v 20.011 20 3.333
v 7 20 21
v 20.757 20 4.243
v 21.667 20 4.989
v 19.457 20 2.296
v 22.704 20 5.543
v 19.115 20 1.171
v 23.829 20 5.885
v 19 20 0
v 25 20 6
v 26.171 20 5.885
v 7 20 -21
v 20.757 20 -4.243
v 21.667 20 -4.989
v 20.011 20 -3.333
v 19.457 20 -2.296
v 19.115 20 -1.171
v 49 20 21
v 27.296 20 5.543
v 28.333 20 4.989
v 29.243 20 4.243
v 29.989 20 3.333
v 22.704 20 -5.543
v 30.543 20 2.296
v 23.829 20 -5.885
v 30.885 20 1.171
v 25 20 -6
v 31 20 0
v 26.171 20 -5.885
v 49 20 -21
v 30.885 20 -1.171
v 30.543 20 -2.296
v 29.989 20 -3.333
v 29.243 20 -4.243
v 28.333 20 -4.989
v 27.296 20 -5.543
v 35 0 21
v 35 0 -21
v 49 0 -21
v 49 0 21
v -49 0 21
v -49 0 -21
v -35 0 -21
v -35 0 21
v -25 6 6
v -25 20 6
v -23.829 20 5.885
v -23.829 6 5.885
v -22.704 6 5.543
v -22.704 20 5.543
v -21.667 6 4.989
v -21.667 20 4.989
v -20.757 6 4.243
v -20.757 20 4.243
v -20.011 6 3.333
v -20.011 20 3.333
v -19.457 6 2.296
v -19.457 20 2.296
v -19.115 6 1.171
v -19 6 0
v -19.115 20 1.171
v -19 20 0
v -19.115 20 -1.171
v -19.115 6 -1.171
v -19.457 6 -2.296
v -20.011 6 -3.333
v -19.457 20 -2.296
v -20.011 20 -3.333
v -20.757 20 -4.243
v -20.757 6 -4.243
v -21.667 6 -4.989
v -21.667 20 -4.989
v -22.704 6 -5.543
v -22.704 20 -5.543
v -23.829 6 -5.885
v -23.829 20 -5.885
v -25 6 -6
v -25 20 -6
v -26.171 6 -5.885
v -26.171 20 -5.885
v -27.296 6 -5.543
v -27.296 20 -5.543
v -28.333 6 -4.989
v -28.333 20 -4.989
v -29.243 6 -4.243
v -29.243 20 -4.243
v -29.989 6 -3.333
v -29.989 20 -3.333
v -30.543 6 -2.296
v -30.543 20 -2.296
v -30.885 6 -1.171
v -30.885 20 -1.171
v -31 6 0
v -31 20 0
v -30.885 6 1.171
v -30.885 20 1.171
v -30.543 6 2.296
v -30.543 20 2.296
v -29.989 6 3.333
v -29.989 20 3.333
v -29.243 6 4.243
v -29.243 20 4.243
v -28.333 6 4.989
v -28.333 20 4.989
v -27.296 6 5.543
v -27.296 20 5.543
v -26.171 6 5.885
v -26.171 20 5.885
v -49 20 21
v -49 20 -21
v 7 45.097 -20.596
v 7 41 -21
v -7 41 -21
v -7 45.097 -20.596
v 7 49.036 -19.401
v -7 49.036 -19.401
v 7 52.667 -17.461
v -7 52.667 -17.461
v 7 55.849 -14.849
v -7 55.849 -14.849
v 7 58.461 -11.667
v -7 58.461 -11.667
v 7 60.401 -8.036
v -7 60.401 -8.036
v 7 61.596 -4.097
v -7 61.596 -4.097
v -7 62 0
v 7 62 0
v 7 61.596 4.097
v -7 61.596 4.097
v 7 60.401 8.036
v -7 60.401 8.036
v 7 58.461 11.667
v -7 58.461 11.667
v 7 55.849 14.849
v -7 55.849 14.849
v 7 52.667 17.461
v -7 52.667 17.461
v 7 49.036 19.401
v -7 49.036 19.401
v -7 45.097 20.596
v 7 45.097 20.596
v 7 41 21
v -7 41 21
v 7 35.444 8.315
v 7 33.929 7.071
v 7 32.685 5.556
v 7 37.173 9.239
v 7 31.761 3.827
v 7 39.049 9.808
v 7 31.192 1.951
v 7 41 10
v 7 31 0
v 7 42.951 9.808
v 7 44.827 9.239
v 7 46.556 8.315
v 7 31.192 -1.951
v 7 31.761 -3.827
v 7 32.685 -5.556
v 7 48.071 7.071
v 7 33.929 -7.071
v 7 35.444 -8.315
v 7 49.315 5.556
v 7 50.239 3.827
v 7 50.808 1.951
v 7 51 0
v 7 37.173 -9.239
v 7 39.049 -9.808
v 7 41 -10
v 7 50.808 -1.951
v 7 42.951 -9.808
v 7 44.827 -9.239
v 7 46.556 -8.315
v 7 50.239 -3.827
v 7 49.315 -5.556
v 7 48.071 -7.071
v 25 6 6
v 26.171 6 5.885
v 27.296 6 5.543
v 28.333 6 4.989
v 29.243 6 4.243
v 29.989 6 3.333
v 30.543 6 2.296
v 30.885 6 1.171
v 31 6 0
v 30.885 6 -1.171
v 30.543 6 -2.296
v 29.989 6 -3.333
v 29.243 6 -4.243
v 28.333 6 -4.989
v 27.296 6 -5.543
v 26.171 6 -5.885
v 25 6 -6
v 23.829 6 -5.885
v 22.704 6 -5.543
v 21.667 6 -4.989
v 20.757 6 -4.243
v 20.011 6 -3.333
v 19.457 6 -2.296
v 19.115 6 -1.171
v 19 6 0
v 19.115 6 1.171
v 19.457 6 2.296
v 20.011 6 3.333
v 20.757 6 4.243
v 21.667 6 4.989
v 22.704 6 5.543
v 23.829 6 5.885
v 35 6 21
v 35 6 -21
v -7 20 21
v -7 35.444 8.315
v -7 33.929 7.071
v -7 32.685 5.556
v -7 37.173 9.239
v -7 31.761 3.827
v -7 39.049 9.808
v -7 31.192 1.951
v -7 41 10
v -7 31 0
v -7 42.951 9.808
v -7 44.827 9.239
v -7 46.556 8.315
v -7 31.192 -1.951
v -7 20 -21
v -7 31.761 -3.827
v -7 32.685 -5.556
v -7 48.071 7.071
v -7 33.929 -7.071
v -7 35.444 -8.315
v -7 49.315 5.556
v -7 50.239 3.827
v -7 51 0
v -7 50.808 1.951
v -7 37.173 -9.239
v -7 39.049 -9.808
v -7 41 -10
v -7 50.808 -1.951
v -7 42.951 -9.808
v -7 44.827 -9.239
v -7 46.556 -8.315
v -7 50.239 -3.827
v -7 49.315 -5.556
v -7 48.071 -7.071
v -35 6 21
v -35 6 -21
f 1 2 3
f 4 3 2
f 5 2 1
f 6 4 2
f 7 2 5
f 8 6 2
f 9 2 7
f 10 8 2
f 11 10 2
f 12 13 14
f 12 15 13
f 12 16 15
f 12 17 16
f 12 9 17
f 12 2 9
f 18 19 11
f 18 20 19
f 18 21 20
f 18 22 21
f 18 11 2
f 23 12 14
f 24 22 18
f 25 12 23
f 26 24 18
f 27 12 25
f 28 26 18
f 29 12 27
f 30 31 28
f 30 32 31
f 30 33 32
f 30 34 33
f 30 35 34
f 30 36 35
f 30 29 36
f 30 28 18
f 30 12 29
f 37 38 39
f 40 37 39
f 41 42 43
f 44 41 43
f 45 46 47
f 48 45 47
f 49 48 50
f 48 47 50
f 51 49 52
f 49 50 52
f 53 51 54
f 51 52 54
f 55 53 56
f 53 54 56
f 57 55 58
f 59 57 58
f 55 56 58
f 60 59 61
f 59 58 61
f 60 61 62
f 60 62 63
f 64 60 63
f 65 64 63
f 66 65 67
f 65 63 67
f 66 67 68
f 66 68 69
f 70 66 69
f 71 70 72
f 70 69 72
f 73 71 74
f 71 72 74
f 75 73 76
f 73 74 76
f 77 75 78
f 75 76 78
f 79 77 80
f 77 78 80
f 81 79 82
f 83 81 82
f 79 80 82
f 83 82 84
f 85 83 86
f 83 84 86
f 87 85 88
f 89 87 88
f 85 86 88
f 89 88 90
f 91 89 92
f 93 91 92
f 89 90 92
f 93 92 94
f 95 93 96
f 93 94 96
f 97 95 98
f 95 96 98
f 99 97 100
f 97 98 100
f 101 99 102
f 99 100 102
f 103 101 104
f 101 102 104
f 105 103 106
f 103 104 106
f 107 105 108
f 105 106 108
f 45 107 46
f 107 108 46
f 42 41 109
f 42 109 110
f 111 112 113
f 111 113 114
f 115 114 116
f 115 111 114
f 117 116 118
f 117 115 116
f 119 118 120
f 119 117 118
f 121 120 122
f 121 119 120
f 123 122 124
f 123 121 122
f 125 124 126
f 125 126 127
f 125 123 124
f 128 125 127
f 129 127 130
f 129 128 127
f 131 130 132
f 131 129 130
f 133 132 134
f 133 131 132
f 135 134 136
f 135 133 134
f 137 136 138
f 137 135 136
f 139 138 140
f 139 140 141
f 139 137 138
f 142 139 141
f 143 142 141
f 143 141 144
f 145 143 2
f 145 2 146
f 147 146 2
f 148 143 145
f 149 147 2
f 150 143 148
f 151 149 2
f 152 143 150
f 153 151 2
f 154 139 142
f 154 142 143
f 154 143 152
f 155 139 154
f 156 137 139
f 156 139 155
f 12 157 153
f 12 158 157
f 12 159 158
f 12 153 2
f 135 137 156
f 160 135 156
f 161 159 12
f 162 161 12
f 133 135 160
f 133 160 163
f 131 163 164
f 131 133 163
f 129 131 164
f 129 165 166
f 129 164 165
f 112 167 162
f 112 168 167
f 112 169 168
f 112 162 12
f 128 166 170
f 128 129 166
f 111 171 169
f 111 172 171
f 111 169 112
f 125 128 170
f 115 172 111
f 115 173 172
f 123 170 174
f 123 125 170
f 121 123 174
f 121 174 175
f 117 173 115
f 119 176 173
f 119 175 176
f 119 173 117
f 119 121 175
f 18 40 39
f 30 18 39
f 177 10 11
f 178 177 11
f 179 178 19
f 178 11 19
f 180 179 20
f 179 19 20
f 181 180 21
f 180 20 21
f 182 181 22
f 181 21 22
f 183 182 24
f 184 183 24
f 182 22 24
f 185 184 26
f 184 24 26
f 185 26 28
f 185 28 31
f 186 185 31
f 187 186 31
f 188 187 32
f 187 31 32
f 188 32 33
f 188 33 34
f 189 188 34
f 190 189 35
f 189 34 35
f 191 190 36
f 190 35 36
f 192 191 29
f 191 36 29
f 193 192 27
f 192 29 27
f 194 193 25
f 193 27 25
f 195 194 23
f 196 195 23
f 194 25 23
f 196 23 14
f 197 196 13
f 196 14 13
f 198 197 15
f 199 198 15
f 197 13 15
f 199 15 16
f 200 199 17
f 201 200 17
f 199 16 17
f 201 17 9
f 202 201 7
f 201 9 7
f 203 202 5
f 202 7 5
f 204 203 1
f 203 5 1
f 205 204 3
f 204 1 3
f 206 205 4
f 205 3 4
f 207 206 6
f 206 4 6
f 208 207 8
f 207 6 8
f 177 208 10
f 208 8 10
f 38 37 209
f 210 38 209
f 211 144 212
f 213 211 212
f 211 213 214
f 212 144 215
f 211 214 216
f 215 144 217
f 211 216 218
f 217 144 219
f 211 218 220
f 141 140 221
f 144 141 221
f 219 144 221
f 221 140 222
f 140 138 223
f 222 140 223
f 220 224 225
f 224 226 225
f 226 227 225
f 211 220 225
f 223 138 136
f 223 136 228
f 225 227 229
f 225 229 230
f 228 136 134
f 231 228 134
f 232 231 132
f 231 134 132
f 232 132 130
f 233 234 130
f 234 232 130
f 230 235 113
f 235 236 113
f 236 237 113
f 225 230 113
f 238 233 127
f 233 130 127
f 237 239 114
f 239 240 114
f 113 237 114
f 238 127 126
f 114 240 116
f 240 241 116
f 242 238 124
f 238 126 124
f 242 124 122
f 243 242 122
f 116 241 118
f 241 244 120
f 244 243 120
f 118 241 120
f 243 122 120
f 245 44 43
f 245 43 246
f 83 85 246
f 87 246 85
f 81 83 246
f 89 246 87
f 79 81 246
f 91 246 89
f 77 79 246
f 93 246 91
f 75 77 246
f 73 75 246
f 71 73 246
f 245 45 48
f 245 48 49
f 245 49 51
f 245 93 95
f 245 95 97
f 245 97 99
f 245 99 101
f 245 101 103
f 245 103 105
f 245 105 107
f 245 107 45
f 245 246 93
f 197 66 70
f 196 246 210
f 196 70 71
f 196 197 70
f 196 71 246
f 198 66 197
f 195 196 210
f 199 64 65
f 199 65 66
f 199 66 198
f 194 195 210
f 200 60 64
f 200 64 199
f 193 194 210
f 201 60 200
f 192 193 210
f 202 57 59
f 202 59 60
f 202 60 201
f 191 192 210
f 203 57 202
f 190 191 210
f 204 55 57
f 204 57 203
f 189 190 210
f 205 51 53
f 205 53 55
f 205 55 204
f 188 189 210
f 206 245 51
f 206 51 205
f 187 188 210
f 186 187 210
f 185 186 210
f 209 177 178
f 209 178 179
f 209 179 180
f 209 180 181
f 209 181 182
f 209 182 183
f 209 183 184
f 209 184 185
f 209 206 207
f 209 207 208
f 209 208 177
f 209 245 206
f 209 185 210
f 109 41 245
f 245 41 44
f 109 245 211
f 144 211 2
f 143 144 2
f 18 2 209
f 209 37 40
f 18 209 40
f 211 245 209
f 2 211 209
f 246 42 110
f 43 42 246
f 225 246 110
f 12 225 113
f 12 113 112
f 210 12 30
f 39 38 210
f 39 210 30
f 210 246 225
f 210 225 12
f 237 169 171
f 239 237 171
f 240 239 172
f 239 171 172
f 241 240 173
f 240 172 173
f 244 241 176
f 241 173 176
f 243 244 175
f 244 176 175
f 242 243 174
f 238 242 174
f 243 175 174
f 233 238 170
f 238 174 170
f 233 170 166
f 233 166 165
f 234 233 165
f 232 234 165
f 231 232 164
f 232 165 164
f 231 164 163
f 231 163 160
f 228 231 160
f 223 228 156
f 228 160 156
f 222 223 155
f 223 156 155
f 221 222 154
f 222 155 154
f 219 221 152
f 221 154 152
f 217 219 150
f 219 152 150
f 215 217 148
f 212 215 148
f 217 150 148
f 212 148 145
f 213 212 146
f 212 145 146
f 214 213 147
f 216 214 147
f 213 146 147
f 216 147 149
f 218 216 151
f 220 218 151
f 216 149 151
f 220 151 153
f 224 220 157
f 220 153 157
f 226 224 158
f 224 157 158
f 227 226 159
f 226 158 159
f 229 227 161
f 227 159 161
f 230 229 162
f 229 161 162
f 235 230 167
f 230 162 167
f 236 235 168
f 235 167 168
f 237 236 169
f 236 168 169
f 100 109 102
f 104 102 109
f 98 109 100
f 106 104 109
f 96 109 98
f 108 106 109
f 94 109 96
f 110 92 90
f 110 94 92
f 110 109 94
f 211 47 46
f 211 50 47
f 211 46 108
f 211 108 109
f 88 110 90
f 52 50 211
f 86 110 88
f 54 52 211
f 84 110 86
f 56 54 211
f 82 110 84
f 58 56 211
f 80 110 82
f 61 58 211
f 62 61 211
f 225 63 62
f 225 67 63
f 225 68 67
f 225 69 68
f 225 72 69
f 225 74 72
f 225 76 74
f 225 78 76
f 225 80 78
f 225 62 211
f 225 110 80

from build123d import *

# Parameters (mm, degrees)
SKETCH1_W                = 98
SKETCH1_H                = 42
BOSS_EXTRUDE1_DEPTH      = 20
SKETCH2_W                = 70
SKETCH2_H                = 6
CUT_EXTRUDE1_DEPTH       = 68.564783726
SKETCH3_R                = 6
CUT_EXTRUDE2_DEPTH       = 14
BOSS_EXTRUDE2_DEPTH      = 7
BOSS_EXTRUDE2_DEPTH_BACK = 7
SKETCH4_W                = 42
SKETCH4_H                = 42
FILLET1_RADIUS           = 21
FILLET1_LENGTH           = 14
SKETCH5_R                = 10
CUT_EXTRUDE3_DEPTH       = 14


with BuildPart() as part:
    # Sketch1 → Boss-Extrude1 (new body)
    with BuildSketch(Plane(origin=(0, 0, 0), x_dir=(1, 0, 0), z_dir=(0, 1, 0))):
        Rectangle(SKETCH1_W, SKETCH1_H)
    extrude(amount=BOSS_EXTRUDE1_DEPTH)

    # Sketch2 → Cut-Extrude1 (cut, through all)
    with BuildSketch(Plane.XY.offset(21)):
        with Locations((0, 3)):
            Rectangle(SKETCH2_W, SKETCH2_H)
    extrude(amount=-CUT_EXTRUDE1_DEPTH, mode=Mode.SUBTRACT)

    # Sketch3 → Cut-Extrude2 (cut)
    with BuildSketch(Plane(origin=(0, 20, 0), x_dir=(1, 0, 0), z_dir=(0, 1, 0))):
        with Locations(Location((25, 0, 0), (0, 0, 270))):
            Circle(SKETCH3_R)
        with Locations(Location((-25, 0, 0), (0, 0, 270))):
            Circle(SKETCH3_R)
    extrude(amount=-CUT_EXTRUDE2_DEPTH, mode=Mode.SUBTRACT)

    # Sketch4 → Boss-Extrude2 (add, two sides: drawn at the far end of the back side and taken through both)
    with BuildSketch(Plane(origin=(0, 0, 0), x_dir=(0, 0, -1), z_dir=(1, 0, 0)).offset(-BOSS_EXTRUDE2_DEPTH_BACK)):
        with Locations((0, 41)):
            Rectangle(SKETCH4_W, SKETCH4_H)
    extrude(amount=BOSS_EXTRUDE2_DEPTH + BOSS_EXTRUDE2_DEPTH_BACK)

    # Fillet1: full round fillet: the end face becomes a half cylinder, R = half its width
    fillet1_face = Plane((0, 62, 0), x_dir=(1, 0, 0), z_dir=(0, 1, 0))  # on the end face: x along it, z out of the body
    fillet1_slab = fillet1_face.offset(-FILLET1_RADIUS / 2) * Box(FILLET1_LENGTH, 2 * FILLET1_RADIUS, FILLET1_RADIUS, mode=Mode.PRIVATE)  # the body's end, R deep
    fillet1_round = Plane((0, 41, 0), x_dir=(0, 1, 0), z_dir=(1, 0, 0)) * Cylinder(FILLET1_RADIUS, FILLET1_LENGTH, mode=Mode.PRIVATE)  # its axis R under the face
    add(fillet1_slab - fillet1_round, mode=Mode.SUBTRACT)

    # Sketch5 → Cut-Extrude3 (cut)
    with BuildSketch(Plane(origin=(7, 0, 0), x_dir=(0, 0, -1), z_dir=(1, 0, 0))):
        with Locations((0, 41)):
            Circle(SKETCH5_R)
    extrude(amount=-CUT_EXTRUDE3_DEPTH, mode=Mode.SUBTRACT)


solid = part.part
